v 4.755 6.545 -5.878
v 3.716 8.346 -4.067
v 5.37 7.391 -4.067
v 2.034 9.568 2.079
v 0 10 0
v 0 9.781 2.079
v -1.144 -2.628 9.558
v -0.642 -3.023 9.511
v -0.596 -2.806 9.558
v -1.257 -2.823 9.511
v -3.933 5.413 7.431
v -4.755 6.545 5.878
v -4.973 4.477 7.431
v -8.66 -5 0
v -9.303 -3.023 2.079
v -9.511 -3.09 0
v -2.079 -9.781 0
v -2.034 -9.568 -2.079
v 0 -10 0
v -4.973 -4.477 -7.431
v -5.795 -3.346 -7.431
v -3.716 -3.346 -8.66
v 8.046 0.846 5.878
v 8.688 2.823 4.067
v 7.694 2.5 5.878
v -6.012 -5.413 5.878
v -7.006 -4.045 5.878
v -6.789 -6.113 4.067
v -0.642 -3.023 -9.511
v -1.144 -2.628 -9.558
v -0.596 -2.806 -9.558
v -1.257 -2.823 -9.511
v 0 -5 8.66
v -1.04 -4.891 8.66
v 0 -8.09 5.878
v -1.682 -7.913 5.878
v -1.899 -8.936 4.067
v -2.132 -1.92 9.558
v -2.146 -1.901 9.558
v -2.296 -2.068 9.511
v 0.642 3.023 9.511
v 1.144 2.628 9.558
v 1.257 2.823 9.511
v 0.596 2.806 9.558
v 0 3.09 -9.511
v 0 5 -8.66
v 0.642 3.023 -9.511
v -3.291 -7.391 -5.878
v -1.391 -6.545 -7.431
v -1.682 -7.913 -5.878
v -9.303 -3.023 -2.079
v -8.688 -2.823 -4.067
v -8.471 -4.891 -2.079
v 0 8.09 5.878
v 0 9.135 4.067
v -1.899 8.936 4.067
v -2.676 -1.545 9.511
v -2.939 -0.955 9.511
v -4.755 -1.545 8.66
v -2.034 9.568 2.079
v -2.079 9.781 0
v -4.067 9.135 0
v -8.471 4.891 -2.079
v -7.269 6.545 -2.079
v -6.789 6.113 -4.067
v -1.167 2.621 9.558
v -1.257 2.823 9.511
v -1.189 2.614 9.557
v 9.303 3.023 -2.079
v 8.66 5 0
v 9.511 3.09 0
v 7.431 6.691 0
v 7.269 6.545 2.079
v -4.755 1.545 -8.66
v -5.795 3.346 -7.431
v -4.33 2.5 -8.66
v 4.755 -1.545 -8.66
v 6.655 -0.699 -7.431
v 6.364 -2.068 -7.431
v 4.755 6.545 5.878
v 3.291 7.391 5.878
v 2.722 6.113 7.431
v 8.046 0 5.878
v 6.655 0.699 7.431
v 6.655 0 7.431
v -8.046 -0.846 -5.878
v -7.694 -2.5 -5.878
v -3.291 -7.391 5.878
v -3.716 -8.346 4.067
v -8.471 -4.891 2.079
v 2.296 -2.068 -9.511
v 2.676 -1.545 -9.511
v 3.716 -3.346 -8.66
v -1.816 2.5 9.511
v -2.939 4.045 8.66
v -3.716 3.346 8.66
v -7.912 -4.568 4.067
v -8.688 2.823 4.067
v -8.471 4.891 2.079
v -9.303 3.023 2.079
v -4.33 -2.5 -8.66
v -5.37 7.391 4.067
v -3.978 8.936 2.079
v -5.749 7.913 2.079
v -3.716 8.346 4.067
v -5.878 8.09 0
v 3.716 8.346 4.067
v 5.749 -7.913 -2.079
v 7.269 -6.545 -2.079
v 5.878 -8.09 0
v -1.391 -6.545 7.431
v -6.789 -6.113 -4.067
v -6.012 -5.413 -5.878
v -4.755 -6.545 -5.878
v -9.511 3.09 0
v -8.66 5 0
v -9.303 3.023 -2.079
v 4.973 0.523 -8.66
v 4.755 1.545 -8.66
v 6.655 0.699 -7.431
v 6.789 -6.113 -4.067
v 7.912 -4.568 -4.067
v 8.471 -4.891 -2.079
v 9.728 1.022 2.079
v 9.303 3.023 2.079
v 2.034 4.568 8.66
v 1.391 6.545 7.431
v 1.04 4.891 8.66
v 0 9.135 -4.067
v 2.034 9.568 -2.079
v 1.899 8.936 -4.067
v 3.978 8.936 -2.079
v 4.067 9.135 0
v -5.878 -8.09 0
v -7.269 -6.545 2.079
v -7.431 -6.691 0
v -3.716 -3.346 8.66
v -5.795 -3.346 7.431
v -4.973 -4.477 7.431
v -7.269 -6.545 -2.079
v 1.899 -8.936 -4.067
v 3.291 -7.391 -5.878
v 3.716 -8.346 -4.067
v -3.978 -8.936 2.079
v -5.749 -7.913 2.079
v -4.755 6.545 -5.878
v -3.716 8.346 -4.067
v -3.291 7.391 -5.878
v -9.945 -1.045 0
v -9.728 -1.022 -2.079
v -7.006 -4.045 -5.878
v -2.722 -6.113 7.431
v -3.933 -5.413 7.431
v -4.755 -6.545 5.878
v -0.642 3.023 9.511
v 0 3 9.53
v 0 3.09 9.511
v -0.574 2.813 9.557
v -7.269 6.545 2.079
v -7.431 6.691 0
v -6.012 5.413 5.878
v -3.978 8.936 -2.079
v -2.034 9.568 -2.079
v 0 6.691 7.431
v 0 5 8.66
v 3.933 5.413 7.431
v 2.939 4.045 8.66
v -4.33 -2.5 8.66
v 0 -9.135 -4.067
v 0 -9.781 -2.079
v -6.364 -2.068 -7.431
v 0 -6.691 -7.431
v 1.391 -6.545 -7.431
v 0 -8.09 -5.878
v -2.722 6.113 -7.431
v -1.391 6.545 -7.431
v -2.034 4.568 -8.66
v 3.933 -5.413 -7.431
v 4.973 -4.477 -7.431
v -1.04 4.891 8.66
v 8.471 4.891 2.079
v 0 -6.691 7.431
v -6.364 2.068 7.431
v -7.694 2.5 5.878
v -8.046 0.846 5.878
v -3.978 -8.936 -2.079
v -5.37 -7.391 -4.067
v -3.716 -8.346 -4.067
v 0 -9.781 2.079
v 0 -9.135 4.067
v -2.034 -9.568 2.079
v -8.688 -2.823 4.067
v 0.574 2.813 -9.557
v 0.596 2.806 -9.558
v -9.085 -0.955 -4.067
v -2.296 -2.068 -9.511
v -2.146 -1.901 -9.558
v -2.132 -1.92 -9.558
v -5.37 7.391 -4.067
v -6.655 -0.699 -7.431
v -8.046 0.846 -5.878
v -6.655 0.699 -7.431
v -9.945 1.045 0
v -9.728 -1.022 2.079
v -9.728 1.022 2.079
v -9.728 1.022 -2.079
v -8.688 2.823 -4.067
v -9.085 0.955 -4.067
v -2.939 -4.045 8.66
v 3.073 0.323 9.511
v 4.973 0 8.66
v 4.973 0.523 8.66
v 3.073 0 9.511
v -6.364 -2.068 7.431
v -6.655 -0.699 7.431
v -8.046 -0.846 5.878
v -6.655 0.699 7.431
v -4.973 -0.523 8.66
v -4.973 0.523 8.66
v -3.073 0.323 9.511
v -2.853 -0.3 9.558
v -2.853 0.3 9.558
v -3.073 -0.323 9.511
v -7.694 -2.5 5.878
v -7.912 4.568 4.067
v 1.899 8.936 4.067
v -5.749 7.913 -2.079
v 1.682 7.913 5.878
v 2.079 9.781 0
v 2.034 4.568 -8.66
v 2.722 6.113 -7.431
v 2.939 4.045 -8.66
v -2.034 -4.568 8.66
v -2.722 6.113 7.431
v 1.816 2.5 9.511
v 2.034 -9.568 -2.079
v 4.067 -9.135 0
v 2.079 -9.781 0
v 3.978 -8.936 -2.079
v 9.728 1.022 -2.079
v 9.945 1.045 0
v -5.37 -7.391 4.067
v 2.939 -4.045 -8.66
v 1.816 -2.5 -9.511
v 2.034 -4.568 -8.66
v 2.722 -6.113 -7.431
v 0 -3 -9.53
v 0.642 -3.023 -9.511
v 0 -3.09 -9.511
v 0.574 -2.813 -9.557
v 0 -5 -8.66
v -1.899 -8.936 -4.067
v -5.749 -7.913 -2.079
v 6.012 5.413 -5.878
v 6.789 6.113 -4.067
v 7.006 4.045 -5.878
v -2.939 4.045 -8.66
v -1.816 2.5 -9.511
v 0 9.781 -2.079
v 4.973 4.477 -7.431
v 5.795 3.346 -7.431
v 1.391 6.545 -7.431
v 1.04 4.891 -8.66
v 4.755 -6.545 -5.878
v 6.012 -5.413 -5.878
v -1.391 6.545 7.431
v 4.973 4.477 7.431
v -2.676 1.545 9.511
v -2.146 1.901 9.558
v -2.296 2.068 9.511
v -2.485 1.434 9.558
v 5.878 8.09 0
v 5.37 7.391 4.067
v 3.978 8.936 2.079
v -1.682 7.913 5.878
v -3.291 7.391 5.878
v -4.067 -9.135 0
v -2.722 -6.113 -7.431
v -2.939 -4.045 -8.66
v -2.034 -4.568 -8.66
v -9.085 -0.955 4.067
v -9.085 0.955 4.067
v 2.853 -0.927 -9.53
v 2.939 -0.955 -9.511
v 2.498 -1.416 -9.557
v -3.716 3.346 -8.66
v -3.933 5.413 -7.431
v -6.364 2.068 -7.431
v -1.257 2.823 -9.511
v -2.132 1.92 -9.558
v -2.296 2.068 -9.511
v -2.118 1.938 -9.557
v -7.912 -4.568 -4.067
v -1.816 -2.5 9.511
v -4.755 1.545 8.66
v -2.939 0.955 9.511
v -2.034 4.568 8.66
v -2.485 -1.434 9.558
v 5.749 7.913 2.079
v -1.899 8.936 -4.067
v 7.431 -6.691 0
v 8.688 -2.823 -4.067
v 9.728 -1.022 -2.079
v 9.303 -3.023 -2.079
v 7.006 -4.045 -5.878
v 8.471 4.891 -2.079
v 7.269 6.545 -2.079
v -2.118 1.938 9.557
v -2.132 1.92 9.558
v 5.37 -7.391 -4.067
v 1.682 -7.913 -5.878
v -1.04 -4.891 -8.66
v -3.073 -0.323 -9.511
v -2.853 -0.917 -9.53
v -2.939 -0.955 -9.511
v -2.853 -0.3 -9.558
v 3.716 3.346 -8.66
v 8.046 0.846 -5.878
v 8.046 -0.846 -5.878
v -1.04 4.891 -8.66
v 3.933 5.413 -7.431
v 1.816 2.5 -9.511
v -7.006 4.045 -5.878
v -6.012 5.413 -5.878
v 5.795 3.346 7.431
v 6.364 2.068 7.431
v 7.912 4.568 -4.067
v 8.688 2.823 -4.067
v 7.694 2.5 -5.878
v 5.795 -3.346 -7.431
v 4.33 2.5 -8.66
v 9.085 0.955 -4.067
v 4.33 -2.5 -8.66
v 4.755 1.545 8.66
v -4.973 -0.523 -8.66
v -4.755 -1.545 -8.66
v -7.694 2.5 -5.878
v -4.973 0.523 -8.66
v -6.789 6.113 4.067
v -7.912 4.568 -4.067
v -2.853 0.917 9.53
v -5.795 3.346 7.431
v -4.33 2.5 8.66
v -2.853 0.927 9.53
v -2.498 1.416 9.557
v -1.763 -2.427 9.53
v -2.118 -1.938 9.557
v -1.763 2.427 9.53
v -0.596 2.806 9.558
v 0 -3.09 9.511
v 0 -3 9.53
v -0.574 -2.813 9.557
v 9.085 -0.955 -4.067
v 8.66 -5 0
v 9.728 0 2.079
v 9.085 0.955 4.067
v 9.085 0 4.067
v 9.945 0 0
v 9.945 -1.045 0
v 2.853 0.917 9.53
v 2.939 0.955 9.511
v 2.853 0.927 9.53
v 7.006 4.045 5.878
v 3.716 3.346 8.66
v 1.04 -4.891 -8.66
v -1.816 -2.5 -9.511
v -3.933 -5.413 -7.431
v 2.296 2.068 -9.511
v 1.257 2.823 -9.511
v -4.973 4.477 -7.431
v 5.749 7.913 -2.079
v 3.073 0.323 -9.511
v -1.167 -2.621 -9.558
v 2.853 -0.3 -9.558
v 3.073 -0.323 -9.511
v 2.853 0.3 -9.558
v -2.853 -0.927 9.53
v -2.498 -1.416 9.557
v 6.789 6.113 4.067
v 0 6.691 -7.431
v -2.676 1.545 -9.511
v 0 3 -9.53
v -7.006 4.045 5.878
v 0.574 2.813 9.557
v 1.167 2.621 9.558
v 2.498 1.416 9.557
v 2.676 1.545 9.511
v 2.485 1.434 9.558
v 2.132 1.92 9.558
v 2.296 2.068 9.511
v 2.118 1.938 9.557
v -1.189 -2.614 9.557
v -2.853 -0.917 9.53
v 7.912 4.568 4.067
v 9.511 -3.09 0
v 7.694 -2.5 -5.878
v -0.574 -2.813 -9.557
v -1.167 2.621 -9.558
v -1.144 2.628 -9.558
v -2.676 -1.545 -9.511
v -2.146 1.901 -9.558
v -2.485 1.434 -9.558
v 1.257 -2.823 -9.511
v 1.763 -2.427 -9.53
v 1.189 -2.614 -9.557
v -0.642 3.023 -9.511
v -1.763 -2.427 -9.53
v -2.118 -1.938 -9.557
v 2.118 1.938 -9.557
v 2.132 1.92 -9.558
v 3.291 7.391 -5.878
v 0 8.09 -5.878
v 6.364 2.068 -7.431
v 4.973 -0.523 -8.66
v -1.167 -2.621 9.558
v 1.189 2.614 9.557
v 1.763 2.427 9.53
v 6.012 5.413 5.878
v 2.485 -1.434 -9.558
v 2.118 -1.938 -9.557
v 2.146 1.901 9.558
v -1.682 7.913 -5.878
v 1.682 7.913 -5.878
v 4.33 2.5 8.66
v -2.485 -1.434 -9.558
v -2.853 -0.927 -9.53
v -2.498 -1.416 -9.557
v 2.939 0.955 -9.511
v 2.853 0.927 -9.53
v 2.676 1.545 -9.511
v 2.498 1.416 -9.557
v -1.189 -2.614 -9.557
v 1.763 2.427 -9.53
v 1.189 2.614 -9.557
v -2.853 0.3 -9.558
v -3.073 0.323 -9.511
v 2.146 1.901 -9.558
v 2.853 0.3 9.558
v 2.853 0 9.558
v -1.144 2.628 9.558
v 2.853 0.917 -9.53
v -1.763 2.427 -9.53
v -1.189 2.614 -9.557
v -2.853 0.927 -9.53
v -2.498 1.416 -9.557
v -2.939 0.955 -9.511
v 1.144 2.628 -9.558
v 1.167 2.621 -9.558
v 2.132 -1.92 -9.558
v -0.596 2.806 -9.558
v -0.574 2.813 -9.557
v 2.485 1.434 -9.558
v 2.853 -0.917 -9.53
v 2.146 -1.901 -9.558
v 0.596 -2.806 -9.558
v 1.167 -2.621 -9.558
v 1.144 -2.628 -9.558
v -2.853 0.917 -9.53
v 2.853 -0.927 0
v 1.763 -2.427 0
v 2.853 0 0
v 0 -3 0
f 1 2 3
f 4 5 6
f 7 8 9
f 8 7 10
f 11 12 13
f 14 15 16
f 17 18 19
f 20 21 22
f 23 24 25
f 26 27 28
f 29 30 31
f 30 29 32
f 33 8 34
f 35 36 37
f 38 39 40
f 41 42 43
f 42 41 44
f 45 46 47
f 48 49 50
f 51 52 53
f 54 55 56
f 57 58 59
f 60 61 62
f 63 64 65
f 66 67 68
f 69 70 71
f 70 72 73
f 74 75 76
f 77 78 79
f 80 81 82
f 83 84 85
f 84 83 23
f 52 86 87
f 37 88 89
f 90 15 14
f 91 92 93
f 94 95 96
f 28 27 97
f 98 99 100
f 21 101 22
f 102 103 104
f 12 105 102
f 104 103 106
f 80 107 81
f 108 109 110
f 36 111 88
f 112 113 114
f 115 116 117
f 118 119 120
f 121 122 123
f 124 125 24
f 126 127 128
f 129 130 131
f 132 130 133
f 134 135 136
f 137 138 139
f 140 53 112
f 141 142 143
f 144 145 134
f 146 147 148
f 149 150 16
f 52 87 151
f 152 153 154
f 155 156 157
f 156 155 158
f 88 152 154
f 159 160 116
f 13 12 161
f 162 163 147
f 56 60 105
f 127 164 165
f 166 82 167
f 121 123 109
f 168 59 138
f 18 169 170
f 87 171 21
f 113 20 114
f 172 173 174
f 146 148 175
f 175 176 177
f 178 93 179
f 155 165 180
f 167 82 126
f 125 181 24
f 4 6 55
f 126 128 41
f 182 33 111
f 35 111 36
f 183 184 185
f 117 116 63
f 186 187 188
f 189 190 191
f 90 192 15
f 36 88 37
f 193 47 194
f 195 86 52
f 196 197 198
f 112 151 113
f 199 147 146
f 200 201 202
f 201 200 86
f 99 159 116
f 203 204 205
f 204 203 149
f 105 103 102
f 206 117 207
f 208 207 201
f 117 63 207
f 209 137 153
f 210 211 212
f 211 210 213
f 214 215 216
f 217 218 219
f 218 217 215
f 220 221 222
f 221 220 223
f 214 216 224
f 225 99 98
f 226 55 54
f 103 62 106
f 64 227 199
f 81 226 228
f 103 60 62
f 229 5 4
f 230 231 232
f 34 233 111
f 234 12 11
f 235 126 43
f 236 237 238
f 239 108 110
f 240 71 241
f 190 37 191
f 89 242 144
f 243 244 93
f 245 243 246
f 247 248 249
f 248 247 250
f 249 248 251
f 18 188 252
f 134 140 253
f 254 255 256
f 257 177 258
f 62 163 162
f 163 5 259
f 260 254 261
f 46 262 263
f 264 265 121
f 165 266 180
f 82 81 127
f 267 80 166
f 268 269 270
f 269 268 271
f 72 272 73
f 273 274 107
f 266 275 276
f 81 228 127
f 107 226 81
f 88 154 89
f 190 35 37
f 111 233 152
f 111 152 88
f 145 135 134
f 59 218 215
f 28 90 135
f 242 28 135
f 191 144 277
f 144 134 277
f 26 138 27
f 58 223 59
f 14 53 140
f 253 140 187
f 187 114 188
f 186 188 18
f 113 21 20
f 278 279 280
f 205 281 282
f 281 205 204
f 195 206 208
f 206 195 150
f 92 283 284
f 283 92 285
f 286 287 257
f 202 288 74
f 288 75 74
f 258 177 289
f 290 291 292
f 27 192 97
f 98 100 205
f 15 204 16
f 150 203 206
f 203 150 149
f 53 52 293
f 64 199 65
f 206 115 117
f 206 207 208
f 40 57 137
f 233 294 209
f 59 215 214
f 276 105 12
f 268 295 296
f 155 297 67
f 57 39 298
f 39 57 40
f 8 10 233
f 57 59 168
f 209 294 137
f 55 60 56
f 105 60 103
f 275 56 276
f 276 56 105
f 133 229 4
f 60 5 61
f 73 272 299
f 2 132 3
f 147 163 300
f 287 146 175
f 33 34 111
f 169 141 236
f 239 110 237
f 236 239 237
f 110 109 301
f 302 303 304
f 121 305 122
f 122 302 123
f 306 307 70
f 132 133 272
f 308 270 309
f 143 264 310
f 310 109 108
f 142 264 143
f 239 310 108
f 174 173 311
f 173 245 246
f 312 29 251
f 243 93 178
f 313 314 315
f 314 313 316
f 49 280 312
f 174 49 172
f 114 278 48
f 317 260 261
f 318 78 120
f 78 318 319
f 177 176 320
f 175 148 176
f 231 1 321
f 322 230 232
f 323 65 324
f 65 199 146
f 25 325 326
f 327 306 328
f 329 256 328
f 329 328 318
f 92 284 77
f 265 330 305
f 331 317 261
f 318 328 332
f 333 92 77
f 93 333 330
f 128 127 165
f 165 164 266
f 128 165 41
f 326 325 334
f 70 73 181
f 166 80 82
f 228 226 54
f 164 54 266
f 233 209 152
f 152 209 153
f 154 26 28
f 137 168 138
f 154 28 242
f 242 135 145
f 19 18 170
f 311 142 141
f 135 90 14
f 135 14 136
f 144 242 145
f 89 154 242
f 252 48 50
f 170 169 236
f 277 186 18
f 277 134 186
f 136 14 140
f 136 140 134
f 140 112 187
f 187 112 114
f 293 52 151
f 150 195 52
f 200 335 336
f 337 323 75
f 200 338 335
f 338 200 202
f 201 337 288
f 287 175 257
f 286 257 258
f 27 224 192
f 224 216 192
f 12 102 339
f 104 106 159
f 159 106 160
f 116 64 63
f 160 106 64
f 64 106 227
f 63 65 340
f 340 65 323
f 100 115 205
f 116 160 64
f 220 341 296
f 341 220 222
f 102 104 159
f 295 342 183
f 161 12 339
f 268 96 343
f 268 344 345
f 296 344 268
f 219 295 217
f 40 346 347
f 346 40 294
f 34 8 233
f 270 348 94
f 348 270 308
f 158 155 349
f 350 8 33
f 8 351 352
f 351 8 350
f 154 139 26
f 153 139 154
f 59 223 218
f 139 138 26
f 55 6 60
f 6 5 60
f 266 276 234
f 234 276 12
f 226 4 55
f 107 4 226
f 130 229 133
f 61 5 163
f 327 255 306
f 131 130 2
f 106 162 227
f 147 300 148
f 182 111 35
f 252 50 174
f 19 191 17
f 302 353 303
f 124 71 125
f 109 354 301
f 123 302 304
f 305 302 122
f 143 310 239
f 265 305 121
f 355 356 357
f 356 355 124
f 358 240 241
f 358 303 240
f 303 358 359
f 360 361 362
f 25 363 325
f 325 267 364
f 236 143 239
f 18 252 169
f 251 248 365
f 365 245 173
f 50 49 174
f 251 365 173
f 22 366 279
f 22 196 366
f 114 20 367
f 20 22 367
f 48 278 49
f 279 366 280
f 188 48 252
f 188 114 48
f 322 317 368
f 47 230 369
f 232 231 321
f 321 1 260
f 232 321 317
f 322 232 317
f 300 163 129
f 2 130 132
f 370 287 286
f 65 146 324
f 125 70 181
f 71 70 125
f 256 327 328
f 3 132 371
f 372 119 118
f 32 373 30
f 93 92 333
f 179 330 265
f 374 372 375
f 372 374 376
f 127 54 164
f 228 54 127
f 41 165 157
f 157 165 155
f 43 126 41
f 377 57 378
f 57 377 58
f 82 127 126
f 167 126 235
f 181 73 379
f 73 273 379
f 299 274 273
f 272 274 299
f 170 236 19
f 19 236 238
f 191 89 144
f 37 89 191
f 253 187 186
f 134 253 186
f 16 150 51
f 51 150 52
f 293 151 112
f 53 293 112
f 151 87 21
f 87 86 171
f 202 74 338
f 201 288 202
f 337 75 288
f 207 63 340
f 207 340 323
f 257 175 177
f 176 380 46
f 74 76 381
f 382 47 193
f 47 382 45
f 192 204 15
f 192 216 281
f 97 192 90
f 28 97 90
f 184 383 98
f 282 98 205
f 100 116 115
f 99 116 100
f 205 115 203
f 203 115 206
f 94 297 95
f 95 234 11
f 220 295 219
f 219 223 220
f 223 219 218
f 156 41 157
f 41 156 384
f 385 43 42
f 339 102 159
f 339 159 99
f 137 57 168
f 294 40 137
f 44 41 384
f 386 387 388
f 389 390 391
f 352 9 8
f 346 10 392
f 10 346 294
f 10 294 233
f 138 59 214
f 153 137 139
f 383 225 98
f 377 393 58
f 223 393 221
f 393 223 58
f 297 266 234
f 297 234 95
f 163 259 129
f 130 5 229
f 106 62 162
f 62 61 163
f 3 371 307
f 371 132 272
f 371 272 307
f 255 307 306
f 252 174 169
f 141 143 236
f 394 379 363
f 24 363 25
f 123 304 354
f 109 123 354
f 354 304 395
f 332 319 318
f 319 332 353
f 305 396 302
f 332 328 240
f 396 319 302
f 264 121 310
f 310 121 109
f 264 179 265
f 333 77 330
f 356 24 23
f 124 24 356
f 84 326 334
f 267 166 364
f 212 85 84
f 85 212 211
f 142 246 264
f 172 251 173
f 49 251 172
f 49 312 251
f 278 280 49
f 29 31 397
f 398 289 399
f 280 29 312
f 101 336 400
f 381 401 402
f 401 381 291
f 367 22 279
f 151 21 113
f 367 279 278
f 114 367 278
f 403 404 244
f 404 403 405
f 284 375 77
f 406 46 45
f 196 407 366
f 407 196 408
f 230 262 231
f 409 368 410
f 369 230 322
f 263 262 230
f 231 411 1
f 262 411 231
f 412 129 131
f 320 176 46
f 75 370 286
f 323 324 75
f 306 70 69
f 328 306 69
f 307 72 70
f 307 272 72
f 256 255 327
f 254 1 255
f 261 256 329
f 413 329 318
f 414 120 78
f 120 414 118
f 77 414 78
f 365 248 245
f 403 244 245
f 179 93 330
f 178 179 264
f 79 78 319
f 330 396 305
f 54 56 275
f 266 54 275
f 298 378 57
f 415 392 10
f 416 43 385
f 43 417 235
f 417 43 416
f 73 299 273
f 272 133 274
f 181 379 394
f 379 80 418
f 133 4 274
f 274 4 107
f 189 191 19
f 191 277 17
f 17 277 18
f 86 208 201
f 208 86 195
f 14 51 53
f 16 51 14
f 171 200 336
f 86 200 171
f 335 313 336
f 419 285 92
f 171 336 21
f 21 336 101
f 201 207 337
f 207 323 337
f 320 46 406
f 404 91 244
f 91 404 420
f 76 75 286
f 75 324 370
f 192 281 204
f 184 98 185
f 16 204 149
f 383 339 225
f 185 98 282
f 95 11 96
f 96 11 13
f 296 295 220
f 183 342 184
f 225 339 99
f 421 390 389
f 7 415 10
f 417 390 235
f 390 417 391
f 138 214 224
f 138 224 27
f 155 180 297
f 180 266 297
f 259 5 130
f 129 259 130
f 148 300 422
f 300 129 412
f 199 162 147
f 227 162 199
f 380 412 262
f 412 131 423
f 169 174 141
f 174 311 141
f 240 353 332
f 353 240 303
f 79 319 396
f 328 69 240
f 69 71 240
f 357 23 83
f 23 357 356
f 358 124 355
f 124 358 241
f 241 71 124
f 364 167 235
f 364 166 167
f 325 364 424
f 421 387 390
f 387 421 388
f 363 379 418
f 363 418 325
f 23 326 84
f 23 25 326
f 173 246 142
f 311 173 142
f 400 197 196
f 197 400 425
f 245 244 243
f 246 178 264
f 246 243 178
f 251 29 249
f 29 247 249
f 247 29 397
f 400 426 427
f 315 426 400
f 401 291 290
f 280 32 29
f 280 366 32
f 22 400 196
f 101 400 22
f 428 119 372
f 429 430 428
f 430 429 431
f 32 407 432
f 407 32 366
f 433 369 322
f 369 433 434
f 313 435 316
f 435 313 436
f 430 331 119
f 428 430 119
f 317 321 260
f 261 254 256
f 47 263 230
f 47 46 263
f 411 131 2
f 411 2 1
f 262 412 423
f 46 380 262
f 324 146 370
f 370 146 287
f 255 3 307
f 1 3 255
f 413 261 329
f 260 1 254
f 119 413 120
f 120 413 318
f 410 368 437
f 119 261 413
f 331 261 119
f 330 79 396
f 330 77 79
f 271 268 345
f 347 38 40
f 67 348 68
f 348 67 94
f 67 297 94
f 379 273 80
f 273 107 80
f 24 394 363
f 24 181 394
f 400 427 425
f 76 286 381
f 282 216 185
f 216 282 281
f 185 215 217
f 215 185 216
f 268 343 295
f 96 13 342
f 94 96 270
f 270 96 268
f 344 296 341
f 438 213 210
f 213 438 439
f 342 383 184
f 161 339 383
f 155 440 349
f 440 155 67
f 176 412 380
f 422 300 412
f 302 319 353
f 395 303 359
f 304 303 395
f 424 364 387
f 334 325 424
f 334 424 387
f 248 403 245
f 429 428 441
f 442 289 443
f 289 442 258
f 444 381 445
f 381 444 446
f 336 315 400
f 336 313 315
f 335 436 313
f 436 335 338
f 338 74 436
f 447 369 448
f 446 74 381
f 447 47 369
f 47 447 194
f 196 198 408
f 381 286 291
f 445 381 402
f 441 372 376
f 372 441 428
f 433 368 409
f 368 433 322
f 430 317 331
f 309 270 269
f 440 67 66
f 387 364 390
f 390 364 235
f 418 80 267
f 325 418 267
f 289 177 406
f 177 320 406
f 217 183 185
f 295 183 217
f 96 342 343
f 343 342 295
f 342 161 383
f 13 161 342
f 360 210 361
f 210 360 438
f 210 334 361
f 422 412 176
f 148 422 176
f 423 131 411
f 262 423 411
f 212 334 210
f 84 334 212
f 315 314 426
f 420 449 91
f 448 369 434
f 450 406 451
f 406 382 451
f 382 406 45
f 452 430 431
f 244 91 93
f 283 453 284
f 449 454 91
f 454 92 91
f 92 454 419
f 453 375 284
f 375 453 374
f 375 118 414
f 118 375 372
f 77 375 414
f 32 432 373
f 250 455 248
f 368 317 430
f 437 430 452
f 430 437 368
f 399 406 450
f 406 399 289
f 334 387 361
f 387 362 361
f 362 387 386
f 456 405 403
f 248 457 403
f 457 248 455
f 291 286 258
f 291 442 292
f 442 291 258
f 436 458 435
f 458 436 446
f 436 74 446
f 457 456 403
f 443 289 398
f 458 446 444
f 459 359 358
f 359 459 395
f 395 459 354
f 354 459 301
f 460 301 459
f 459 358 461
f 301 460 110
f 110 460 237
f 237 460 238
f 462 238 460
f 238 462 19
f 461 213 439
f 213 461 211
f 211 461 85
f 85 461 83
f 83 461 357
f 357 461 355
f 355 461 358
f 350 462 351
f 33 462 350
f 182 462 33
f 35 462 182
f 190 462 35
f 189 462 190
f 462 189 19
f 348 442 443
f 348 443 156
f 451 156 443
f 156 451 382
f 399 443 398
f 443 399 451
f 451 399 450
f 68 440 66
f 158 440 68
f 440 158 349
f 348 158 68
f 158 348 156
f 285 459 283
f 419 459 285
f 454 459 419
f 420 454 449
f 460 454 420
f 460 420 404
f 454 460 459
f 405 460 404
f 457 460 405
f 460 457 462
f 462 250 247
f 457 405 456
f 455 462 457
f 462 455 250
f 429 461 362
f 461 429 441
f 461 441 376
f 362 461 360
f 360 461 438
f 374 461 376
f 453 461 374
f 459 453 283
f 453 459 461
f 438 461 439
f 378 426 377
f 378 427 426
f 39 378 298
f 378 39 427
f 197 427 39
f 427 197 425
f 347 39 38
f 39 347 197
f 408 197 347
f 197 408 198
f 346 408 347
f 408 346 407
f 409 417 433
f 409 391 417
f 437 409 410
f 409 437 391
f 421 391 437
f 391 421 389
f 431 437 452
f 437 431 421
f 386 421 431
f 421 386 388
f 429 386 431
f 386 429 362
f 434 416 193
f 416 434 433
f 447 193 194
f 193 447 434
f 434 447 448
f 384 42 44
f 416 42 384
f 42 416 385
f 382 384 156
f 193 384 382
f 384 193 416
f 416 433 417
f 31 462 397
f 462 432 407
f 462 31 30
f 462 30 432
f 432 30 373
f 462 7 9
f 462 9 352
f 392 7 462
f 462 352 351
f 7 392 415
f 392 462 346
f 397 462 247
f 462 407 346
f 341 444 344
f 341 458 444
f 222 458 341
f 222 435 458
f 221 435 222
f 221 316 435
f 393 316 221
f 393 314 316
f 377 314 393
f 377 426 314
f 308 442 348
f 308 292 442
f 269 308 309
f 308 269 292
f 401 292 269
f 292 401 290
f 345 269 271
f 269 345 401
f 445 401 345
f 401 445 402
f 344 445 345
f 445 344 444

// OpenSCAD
// https://github.com/openscad/openscad/pull/5185#issuecomment-2183769802
rotate([0, 0, -90])
  difference() {
    color("yellow")
      render()
        difference() {
          color("red") sphere(10);
          color("blue") cube(10);
        }
    color("green")
      cylinder(r=3, h=20, center=true);
  }
